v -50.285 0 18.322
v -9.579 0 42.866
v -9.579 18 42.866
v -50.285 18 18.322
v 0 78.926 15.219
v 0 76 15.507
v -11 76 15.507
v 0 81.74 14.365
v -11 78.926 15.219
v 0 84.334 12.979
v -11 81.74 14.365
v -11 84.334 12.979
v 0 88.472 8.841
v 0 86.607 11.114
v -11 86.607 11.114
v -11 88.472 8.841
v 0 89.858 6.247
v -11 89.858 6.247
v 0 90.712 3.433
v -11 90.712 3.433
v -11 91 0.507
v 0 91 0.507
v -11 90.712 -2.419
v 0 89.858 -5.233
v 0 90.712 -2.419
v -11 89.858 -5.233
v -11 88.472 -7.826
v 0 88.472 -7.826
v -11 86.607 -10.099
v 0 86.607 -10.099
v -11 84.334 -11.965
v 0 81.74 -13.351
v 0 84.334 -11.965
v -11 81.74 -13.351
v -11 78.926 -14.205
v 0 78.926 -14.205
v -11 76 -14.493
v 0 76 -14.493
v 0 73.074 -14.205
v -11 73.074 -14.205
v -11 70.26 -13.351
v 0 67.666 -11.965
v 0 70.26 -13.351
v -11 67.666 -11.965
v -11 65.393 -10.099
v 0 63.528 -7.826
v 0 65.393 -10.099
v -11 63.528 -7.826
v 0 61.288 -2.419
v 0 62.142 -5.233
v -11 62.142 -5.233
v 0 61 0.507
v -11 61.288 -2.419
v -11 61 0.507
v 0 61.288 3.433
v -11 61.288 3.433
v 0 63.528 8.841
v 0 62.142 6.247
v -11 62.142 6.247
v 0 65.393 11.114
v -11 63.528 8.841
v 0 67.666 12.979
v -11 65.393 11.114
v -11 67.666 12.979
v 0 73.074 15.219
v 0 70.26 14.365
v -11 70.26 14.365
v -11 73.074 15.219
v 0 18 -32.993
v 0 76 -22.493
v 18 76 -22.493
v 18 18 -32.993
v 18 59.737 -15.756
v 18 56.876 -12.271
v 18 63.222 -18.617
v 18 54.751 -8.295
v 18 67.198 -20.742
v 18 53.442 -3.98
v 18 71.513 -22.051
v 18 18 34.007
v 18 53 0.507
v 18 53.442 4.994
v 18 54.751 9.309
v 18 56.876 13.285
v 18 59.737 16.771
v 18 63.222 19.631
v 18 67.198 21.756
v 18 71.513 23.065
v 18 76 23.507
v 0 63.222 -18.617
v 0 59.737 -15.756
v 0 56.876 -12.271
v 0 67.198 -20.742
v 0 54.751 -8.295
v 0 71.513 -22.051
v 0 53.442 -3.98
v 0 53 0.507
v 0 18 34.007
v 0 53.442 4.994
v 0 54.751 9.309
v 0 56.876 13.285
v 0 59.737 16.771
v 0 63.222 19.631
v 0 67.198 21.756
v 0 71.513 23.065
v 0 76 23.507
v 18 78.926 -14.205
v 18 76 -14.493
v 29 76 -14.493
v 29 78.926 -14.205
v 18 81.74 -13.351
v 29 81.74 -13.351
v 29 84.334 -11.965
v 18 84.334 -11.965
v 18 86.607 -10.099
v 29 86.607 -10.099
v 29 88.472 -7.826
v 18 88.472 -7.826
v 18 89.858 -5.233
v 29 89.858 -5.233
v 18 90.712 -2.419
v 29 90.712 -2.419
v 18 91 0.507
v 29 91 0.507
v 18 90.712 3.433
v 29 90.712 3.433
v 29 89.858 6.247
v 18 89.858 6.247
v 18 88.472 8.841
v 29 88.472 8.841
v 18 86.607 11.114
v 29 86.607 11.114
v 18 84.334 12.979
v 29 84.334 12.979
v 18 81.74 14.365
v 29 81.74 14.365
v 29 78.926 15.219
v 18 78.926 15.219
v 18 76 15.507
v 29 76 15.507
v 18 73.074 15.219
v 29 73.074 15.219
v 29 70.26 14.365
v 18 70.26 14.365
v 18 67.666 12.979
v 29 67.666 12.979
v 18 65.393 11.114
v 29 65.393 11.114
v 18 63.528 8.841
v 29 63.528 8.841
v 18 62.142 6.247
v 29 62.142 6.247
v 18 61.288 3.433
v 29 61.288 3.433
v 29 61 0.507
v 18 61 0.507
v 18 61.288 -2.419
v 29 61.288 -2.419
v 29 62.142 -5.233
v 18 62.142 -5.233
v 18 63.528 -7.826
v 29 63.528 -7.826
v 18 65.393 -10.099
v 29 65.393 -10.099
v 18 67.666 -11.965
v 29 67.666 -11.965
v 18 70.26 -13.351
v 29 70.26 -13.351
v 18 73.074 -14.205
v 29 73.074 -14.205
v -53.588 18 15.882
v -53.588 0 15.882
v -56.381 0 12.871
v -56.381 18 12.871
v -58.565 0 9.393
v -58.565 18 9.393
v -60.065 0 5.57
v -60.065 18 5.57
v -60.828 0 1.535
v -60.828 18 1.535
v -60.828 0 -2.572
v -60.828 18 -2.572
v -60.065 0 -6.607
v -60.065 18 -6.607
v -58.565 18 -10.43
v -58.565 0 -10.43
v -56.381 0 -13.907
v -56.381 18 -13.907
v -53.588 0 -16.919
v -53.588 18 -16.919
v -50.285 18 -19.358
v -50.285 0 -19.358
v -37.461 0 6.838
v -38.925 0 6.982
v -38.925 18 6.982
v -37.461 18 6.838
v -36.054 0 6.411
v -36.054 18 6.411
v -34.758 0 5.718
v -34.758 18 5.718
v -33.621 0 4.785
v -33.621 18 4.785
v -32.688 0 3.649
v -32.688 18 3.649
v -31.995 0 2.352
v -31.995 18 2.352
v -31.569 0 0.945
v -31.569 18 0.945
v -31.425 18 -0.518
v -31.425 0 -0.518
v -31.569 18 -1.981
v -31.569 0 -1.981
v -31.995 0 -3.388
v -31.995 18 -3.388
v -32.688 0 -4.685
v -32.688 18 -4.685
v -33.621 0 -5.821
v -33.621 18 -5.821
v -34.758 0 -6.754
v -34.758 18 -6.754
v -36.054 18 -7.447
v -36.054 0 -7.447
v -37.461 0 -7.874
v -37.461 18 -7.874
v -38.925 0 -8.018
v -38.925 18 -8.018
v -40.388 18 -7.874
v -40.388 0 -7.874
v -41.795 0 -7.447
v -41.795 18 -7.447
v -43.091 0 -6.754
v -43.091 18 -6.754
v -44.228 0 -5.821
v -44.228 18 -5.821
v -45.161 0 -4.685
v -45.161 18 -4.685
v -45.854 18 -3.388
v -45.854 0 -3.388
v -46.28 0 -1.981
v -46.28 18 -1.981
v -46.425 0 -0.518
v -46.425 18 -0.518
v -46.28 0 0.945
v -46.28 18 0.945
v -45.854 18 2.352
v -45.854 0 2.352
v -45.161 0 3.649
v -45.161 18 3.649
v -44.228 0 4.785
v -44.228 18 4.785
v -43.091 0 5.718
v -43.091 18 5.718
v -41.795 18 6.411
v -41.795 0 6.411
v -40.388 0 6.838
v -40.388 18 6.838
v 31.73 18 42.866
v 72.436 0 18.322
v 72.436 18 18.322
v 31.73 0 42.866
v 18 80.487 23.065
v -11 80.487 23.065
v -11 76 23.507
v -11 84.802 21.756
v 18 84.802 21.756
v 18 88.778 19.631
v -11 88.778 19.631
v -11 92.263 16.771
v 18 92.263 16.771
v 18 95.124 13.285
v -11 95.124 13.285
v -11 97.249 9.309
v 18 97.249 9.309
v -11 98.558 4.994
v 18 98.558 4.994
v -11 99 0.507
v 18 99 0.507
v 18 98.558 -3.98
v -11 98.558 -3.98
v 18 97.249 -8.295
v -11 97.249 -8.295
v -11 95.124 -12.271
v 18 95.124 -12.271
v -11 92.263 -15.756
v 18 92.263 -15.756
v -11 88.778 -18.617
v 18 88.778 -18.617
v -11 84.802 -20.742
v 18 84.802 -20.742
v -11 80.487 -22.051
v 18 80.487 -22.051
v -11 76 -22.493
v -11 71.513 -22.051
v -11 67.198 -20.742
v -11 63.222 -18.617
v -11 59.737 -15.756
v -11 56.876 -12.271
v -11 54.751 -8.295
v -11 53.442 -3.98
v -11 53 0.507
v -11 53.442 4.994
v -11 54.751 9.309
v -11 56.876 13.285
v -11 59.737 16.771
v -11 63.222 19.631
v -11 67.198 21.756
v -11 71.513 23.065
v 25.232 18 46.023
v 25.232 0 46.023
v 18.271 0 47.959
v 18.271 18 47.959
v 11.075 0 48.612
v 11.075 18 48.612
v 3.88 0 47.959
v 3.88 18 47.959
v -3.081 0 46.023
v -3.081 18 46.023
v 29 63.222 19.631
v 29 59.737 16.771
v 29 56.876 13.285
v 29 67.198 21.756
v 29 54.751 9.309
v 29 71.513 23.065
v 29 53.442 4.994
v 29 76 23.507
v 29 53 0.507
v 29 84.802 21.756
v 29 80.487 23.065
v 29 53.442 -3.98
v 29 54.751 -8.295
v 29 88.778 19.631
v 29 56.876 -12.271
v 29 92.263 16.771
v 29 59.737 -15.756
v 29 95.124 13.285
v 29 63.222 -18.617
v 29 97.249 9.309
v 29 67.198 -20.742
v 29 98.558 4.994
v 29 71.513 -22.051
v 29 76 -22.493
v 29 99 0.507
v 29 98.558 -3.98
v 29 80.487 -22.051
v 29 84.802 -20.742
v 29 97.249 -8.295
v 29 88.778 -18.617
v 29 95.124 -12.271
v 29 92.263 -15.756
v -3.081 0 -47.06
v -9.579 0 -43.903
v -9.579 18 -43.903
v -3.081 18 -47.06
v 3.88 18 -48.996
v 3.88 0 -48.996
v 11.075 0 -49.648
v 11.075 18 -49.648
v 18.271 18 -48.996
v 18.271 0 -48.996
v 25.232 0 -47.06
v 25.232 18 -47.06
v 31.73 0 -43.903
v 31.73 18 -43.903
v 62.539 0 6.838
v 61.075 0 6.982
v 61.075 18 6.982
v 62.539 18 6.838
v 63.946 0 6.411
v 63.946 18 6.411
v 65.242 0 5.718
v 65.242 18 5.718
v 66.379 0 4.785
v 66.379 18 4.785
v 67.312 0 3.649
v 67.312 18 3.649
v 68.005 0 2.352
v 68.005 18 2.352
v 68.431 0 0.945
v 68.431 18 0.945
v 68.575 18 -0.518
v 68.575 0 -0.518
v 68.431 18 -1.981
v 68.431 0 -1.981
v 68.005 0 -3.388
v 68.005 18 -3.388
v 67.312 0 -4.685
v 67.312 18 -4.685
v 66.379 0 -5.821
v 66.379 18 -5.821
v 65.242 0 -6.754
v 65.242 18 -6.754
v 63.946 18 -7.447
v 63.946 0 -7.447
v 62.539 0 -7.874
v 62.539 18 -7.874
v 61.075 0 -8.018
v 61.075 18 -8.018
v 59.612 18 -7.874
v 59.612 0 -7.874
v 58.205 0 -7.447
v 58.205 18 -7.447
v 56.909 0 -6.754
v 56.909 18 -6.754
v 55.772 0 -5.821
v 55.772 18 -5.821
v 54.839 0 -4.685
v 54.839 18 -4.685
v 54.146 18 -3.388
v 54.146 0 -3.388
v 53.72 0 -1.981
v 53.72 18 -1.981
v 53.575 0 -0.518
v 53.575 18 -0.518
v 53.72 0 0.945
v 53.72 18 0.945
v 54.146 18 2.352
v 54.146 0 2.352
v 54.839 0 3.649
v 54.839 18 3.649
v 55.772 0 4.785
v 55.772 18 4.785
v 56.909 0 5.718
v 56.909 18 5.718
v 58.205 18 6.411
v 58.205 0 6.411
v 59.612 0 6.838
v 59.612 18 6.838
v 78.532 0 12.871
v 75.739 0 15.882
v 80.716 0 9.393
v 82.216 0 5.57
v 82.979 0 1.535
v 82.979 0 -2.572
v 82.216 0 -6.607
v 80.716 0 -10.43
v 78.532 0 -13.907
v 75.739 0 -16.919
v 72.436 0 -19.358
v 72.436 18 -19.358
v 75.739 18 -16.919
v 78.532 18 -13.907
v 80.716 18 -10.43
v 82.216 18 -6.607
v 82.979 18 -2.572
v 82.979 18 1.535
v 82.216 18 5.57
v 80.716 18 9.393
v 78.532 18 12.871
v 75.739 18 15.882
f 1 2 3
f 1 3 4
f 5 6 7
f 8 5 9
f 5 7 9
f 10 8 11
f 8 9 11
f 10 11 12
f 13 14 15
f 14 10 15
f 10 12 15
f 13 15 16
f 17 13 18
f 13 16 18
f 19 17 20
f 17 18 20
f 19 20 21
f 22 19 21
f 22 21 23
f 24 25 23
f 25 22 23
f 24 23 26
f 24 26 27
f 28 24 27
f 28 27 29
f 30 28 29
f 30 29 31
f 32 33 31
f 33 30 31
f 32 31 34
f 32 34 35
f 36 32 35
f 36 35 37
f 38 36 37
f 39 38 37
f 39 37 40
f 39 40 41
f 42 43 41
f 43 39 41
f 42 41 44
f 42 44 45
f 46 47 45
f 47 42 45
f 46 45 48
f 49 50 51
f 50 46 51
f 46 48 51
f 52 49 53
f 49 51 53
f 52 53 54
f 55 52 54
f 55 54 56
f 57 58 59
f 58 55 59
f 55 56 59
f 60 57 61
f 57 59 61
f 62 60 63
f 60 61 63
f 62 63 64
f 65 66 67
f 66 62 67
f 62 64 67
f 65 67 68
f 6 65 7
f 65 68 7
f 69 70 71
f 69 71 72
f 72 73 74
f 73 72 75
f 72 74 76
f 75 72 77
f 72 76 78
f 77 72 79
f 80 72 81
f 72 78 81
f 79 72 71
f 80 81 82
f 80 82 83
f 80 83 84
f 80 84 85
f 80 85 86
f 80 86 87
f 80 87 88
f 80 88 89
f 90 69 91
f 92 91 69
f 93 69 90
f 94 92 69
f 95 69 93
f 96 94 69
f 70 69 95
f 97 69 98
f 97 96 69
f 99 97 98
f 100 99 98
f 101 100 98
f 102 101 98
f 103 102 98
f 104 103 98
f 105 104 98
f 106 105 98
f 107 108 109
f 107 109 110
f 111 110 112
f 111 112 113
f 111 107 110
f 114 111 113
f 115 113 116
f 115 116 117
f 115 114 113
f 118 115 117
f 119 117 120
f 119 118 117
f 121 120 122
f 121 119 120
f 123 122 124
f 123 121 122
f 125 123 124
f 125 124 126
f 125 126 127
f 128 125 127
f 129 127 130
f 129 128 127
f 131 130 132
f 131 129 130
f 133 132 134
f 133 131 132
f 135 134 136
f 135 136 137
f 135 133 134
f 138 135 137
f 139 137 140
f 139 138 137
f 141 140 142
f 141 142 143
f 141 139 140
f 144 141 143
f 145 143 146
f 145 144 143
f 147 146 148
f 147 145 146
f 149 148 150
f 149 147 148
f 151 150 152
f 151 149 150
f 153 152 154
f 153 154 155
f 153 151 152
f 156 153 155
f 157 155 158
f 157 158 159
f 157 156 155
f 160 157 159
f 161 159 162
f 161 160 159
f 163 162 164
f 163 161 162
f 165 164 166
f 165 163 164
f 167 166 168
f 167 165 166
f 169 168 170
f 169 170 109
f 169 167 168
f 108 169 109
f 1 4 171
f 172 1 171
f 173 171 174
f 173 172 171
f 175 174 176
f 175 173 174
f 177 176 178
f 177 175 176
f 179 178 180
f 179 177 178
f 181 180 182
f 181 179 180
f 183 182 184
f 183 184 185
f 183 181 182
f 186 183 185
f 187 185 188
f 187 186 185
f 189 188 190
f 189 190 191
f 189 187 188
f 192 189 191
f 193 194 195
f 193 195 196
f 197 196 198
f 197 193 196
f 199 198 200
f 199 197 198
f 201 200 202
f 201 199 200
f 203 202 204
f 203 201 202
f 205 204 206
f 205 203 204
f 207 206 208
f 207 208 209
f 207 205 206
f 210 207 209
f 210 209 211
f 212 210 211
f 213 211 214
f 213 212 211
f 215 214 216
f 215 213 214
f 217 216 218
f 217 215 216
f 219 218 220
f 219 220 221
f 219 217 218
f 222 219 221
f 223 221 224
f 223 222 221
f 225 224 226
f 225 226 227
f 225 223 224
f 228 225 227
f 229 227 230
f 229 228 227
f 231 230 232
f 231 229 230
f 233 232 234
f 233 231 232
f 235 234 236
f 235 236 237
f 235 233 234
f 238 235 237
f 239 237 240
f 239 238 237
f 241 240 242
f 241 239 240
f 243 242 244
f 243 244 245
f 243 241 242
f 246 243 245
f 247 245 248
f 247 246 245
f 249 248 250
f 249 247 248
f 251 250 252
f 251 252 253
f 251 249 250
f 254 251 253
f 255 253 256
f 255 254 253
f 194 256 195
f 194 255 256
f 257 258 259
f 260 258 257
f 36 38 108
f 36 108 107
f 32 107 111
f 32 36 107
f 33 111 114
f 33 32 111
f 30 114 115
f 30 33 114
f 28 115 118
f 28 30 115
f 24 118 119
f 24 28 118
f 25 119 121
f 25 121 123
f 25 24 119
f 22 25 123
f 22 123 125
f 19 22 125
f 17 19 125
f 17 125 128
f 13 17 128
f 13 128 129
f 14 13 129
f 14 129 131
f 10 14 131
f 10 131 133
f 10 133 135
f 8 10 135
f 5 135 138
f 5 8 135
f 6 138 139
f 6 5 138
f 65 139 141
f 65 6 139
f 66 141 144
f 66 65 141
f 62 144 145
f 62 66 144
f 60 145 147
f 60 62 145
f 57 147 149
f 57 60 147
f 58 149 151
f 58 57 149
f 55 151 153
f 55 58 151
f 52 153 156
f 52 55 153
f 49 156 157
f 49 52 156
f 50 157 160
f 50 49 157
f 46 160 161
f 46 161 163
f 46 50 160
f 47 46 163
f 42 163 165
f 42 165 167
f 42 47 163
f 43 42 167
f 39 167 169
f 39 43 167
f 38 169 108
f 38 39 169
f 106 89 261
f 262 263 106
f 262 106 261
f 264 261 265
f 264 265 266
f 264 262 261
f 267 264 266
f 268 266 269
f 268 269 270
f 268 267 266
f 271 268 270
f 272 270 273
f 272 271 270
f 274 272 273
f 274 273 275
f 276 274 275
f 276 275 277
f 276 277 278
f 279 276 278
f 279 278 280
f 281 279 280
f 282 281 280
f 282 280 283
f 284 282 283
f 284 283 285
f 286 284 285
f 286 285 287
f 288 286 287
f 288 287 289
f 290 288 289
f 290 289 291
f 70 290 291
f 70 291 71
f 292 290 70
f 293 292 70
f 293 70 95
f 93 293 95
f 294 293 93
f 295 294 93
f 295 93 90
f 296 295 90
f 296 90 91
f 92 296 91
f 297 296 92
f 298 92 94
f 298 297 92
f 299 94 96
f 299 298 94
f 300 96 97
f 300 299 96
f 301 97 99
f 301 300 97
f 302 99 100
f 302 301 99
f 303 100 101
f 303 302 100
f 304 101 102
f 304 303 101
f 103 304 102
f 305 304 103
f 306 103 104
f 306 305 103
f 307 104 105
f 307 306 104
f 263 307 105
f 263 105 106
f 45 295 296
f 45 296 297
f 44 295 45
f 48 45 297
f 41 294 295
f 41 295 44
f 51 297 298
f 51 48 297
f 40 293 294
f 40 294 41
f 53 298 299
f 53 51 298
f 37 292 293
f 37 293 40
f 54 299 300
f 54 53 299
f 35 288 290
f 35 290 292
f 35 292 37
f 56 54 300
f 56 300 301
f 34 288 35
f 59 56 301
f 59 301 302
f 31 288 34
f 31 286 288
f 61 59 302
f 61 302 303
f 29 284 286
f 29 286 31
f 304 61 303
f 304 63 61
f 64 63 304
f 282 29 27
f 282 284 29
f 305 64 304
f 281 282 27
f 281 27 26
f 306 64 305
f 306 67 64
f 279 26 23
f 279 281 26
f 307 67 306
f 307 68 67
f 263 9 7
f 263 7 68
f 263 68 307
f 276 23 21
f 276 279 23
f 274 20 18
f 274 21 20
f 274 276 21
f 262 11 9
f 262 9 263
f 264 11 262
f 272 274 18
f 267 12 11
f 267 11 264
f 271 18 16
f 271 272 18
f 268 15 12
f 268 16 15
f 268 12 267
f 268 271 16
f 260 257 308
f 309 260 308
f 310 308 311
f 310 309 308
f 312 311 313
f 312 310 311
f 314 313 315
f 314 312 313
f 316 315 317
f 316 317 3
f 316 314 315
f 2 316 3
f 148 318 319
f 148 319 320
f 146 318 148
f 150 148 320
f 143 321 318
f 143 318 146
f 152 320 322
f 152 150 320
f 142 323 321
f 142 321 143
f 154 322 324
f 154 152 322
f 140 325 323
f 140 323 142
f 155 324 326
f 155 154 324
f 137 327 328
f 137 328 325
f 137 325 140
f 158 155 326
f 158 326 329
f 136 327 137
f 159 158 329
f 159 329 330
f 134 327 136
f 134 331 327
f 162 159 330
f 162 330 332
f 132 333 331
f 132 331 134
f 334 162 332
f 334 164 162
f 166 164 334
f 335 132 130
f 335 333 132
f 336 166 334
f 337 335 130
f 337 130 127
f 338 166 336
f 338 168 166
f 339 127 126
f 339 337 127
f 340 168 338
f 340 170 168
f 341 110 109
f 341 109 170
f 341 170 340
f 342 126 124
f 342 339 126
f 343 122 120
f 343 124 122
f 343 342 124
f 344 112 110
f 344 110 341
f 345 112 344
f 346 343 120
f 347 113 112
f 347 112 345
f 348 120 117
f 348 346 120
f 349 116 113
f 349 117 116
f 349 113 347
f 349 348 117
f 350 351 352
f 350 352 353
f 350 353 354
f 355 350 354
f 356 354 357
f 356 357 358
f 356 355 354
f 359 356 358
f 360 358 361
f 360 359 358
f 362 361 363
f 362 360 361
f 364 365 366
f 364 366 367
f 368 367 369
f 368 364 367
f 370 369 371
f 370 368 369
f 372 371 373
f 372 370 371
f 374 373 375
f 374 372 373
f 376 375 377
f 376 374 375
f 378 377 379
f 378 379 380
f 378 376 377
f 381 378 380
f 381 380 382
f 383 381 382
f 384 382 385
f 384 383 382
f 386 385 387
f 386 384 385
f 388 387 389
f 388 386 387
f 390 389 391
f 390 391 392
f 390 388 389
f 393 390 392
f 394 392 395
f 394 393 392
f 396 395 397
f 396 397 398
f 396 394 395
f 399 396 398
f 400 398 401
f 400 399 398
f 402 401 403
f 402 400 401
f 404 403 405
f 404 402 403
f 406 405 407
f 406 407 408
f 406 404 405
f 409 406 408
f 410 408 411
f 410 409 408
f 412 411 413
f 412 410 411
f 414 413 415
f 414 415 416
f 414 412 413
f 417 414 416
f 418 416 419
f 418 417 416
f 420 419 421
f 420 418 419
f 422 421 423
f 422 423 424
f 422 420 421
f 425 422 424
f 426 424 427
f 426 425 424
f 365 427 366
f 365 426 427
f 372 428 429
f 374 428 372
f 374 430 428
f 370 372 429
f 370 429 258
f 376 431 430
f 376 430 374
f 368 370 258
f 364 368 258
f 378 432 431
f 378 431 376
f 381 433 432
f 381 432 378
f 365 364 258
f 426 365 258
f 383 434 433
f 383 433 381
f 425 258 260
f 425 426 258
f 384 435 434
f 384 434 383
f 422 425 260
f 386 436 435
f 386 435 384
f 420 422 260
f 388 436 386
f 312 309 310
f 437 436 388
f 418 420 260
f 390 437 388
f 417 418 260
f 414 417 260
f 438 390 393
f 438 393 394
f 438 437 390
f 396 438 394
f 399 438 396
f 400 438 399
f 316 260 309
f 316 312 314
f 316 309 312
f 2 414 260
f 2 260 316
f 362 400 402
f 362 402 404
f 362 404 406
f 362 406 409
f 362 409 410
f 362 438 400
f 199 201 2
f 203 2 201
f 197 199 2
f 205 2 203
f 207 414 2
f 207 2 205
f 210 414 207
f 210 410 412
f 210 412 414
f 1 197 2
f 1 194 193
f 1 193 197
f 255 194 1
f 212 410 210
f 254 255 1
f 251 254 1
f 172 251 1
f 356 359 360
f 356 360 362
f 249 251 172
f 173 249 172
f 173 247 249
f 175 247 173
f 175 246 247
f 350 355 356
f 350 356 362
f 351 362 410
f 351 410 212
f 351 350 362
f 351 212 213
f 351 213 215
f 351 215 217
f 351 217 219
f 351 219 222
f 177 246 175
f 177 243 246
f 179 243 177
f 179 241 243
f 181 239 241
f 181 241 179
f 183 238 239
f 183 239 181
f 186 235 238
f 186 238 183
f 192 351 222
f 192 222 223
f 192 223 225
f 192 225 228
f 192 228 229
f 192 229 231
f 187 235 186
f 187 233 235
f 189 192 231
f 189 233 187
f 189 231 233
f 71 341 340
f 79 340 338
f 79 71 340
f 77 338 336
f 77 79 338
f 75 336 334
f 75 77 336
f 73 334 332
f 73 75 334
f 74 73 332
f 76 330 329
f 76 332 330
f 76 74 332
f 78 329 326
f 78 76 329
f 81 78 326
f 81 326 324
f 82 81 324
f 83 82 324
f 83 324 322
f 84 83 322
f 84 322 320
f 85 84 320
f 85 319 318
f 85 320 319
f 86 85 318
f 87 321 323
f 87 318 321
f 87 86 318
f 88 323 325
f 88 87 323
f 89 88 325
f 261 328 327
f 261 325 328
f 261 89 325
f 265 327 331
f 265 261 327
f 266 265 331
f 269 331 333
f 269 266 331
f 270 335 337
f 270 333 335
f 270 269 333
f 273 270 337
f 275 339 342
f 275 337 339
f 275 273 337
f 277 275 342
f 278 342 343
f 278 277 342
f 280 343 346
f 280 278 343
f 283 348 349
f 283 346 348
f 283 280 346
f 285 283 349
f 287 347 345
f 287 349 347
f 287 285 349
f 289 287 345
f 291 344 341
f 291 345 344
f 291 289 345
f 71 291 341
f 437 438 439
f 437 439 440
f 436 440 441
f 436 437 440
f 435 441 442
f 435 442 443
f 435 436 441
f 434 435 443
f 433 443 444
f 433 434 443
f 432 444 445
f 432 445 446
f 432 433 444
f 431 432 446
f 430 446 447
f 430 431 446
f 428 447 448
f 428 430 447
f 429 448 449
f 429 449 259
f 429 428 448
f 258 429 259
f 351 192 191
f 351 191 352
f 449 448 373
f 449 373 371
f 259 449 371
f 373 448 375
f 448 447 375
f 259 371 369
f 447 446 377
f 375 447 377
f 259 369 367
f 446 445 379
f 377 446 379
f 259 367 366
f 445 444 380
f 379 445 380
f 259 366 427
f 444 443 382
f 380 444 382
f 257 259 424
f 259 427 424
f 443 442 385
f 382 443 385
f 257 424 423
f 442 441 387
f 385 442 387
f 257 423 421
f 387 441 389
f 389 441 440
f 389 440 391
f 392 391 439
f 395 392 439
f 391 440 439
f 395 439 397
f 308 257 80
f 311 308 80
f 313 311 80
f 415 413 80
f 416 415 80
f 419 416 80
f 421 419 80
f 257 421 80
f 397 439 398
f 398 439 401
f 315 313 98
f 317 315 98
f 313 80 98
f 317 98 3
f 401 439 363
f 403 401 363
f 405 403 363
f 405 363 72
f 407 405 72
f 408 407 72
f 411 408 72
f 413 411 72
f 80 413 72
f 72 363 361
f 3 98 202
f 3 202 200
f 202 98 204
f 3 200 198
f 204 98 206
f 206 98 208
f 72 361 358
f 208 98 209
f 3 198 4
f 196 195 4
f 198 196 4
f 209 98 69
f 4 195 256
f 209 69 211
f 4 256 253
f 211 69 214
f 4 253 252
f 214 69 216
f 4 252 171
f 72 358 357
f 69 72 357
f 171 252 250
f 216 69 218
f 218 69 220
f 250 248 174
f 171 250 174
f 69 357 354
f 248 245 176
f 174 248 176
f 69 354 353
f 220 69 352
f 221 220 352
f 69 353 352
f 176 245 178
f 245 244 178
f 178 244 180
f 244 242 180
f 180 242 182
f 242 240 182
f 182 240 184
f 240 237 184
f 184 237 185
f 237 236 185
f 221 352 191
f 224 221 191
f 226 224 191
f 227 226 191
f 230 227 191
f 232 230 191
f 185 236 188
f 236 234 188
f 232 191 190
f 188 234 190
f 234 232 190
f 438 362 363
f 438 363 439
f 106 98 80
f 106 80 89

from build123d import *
from build123d.topology import SkipClean

# Parameters (mm, degrees)
SKETCH2_R           = 7.5
BOSS_EXTRUDE1_DEPTH = 18
SKETCH6_R           = 15
BOSS_EXTRUDE2_DEPTH = 18
SKETCH7_R           = 23
SKETCH7_R_2         = 15
BOSS_EXTRUDE3_DEPTH = 11
BOSS_EXTRUDE4_START = 11
SKETCH8_R           = 23
SKETCH8_R_2         = 15
BOSS_EXTRUDE4_DEPTH = 11


with BuildPart() as part:
    # Sketch2 → Boss-Extrude1 (new body)
    with BuildSketch(Plane(origin=(0, 0, 0), x_dir=(1, 0, 0), z_dir=(0, 1, 0))):
        with BuildLine():
            Line((-50.28472319, 19.35816392), (-9.579447433, 43.902799527))
            ThreePointArc((-9.579447433, 43.902799527), (11.075495329, 49.648262025), (31.730438092, 43.902799527))
            Line((31.730438092, 43.902799527), (72.435713849, 19.35816392))
            ThreePointArc((72.435713849, 19.35816392), (83.075495329, 0.518168294), (72.435713849, -18.321827333))
            Line((72.435713849, -18.321827333), (31.730438092, -42.86646294))
            ThreePointArc((31.730438092, -42.86646294), (11.075495329, -48.611925438), (-9.579447433, -42.86646294))
            Line((-9.579447433, -42.86646294), (-50.28472319, -18.321827333))
            ThreePointArc((-50.28472319, -18.321827333), (-60.924504671, 0.518168294), (-50.28472319, 19.35816392))
        make_face()
        with Locations((-38.924504671, 0.518168294)):
            Circle(SKETCH2_R, mode=Mode.SUBTRACT)
        with Locations((61.075495329, 0.518168294)):
            Circle(SKETCH2_R, mode=Mode.SUBTRACT)
    extrude(amount=BOSS_EXTRUDE1_DEPTH)

    # Sketch6 → Boss-Extrude2 (add)
    with BuildSketch(Plane(origin=(0, 0, 0), x_dir=(0, 0, -1), z_dir=(1, 0, 0))):
        with BuildLine():
            Line((-34.007106684, 18), (-23.507106684, 76))
            ThreePointArc((-23.507106684, 76), (-0.507106684, 99), (22.492893316, 76))
            Line((22.492893316, 76), (32.992893316, 18))
            Line((32.992893316, 18), (-34.007106684, 18))
        make_face()
        with Locations((-0.507106684, 76)):
            Circle(SKETCH6_R, mode=Mode.SUBTRACT)
    extrude(amount=BOSS_EXTRUDE2_DEPTH)

    # Sketch7 → Boss-Extrude3 (add)
    with SkipClean():  # the faces are left unmerged after this step: merging them gives an invalid solid
        with BuildSketch(Plane(origin=(18, 0, 0), x_dir=(0, 0, -1), z_dir=(1, 0, 0))):
            with Locations((-0.507106684, 76)):
                Circle(SKETCH7_R)
            with Locations((-0.507106684, 76)):
                Circle(SKETCH7_R_2, mode=Mode.SUBTRACT)
        extrude(amount=BOSS_EXTRUDE3_DEPTH)
    add(part.part.scale(1), mode=Mode.REPLACE)  # the faces are merged on a copy

    # Sketch8 → Boss-Extrude4 (add)
    with SkipClean():  # the faces are left unmerged after this step: merging them gives an invalid solid
        with BuildSketch(Plane.ZY.offset(BOSS_EXTRUDE4_START)):
            with Locations((0.507106684, 76)):
                Circle(SKETCH8_R)
            with Locations((0.507106684, 76)):
                Circle(SKETCH8_R_2, mode=Mode.SUBTRACT)
        extrude(amount=-BOSS_EXTRUDE4_DEPTH)
    add(part.part.scale(1), mode=Mode.REPLACE)  # the faces are merged on a copy


solid = part.part
